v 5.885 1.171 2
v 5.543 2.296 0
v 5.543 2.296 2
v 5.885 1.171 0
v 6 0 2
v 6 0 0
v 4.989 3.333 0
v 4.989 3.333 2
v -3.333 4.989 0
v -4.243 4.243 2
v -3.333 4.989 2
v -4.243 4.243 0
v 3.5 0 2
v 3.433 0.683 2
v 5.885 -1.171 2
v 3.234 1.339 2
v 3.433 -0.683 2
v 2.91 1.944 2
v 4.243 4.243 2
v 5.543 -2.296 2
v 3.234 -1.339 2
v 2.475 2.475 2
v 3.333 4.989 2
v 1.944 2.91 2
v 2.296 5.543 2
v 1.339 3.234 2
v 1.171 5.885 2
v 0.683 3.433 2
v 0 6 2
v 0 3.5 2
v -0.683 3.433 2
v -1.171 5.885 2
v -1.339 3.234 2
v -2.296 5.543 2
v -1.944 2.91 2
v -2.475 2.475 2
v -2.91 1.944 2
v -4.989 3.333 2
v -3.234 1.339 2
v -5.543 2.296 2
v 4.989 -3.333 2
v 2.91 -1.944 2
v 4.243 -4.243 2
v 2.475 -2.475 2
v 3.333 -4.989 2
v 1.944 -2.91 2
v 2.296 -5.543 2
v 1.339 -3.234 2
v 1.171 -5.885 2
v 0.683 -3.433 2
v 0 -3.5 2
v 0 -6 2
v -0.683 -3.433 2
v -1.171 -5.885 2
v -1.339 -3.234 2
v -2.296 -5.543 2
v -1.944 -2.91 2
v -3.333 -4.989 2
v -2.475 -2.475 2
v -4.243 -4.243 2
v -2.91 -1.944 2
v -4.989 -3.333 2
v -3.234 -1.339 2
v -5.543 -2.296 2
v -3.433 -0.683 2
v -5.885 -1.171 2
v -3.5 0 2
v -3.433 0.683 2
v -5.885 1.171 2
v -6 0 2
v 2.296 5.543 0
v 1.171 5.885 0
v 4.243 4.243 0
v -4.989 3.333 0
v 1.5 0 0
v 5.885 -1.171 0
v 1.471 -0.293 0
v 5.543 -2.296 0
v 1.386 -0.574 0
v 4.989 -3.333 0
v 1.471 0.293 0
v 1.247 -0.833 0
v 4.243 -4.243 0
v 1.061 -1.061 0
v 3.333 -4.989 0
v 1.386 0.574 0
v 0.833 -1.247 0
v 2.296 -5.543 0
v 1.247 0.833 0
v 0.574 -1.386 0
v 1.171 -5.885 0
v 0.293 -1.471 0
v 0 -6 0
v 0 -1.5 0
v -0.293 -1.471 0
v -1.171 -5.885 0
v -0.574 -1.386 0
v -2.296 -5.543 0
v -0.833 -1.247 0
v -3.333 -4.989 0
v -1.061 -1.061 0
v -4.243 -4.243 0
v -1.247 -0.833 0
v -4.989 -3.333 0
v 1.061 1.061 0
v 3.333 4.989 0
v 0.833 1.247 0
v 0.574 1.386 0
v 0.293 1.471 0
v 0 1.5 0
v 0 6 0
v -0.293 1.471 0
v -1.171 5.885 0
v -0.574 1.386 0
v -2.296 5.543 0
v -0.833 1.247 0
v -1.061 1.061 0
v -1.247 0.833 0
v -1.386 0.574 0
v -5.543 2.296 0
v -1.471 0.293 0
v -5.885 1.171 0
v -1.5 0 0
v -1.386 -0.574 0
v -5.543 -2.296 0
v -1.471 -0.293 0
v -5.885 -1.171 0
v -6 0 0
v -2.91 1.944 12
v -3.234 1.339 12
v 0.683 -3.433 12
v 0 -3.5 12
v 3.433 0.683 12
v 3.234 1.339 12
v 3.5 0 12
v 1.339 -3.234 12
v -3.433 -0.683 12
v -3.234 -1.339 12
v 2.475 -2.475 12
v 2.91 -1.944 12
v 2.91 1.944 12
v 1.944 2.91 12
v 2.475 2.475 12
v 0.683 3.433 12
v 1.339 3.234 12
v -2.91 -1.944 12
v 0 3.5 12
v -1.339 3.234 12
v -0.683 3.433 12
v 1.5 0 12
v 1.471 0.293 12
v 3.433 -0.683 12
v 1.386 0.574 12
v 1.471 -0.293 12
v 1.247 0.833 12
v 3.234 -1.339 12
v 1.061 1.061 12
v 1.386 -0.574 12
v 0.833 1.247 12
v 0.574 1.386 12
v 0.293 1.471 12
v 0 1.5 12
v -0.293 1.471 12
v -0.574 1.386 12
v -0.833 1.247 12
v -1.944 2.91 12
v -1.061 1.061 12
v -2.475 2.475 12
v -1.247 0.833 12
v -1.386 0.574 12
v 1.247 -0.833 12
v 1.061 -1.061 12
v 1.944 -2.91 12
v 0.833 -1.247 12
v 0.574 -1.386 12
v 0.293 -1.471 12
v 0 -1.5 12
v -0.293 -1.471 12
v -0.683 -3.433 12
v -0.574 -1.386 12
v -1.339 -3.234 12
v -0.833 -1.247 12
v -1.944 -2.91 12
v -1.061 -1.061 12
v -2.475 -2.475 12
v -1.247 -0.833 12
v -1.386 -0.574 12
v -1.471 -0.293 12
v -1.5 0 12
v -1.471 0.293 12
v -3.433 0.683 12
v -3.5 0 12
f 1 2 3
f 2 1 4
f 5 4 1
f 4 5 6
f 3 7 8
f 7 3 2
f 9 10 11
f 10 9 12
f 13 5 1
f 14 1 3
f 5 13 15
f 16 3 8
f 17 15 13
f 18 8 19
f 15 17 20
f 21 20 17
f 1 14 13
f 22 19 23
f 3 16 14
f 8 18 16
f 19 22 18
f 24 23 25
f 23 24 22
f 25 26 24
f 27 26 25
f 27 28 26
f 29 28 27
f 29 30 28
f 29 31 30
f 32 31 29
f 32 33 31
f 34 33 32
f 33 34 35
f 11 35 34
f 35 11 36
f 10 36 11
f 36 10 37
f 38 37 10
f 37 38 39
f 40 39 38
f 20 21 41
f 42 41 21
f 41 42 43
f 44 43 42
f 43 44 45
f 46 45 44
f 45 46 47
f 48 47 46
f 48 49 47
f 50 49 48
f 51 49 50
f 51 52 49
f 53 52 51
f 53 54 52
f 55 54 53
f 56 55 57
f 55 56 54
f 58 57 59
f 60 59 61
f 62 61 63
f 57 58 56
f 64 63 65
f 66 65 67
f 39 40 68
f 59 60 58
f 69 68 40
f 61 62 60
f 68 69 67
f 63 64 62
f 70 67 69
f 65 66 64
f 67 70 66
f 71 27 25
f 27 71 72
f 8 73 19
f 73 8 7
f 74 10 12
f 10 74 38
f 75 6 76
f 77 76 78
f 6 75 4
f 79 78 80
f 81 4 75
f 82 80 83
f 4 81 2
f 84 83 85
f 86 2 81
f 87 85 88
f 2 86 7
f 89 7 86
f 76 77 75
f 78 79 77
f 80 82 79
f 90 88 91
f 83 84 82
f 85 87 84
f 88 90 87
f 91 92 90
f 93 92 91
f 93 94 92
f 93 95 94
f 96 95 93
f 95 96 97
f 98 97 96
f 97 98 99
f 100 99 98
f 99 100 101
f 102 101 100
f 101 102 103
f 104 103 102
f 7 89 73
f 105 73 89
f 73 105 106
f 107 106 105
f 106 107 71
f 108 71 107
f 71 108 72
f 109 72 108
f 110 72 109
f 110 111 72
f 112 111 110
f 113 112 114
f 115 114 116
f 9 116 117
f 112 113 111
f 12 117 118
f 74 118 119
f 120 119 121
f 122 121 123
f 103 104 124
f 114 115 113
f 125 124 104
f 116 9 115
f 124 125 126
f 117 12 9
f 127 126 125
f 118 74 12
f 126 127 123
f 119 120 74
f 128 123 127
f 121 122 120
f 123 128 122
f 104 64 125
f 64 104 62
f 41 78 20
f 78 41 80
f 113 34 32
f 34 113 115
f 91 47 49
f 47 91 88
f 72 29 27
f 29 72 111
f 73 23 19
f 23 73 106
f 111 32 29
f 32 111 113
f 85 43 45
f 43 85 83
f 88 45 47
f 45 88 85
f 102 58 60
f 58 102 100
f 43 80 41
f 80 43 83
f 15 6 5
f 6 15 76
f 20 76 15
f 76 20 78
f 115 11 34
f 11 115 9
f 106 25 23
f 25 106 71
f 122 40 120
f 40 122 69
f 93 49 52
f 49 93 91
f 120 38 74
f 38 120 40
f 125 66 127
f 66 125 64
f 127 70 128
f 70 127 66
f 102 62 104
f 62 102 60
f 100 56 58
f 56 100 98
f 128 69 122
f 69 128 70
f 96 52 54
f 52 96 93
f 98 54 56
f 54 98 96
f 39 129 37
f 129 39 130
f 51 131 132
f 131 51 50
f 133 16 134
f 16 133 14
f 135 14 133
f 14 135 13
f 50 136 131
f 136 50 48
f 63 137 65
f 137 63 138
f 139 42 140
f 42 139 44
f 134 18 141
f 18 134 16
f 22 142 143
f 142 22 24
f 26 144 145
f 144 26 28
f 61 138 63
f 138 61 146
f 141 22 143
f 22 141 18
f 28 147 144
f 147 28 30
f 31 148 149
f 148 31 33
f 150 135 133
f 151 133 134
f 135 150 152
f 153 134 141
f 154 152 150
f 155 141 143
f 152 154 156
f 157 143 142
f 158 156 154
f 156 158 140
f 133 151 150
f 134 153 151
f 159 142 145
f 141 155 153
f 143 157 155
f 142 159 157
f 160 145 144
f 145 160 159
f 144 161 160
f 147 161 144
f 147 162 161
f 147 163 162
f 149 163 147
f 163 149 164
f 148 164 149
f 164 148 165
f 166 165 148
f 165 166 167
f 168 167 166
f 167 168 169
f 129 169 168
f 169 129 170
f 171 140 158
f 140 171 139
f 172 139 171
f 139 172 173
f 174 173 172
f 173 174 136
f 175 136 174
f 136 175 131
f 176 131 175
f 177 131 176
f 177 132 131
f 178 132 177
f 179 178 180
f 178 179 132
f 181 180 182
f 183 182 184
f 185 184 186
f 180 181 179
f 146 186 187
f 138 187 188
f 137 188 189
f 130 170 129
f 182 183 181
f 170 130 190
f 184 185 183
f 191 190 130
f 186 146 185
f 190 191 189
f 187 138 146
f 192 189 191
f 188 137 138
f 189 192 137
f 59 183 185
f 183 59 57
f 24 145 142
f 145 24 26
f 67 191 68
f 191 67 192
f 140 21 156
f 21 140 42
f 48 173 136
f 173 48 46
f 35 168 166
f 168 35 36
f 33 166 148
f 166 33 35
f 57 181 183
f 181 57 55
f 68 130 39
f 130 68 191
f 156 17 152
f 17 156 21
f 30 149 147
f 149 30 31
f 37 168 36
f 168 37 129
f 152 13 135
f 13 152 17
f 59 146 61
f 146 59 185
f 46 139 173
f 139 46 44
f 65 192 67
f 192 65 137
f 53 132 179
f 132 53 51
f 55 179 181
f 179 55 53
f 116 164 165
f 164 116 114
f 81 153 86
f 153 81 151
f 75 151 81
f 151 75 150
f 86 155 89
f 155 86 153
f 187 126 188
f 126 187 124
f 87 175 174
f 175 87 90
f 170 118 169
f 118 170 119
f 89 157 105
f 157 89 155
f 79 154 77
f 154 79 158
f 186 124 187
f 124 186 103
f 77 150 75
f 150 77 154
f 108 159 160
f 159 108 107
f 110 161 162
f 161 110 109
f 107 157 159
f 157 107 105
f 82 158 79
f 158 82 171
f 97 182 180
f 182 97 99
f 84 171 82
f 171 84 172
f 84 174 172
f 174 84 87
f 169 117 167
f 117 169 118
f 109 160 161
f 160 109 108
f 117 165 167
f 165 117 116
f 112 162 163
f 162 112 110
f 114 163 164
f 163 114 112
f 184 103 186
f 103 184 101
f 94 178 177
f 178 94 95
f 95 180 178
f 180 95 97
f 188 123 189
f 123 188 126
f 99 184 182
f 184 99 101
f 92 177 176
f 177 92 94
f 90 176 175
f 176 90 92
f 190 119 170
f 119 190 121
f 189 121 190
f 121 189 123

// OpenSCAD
$fn = 32;

// ----------------------------------------------------------------------
// Micro post: flanged post, 5-20 mm class
// ----------------------------------------------------------------------

// --- parameters (mm) ---
post_d = 7;               // post diameter
post_h = 10;              // post height above the flange
flange_d = 12;            // flange diameter
flange_t = 2;             // flange thickness
bore_d = 3;               // through bore

total_h = post_h + flange_t;  // overall height

difference() {
  union() {
    cylinder(h = flange_t, d = flange_d);
    translate([0, 0, flange_t]) cylinder(h = post_h, d = post_d);
  }
  translate([0, 0, -1]) cylinder(h = total_h + 2, d = bore_d);
}
